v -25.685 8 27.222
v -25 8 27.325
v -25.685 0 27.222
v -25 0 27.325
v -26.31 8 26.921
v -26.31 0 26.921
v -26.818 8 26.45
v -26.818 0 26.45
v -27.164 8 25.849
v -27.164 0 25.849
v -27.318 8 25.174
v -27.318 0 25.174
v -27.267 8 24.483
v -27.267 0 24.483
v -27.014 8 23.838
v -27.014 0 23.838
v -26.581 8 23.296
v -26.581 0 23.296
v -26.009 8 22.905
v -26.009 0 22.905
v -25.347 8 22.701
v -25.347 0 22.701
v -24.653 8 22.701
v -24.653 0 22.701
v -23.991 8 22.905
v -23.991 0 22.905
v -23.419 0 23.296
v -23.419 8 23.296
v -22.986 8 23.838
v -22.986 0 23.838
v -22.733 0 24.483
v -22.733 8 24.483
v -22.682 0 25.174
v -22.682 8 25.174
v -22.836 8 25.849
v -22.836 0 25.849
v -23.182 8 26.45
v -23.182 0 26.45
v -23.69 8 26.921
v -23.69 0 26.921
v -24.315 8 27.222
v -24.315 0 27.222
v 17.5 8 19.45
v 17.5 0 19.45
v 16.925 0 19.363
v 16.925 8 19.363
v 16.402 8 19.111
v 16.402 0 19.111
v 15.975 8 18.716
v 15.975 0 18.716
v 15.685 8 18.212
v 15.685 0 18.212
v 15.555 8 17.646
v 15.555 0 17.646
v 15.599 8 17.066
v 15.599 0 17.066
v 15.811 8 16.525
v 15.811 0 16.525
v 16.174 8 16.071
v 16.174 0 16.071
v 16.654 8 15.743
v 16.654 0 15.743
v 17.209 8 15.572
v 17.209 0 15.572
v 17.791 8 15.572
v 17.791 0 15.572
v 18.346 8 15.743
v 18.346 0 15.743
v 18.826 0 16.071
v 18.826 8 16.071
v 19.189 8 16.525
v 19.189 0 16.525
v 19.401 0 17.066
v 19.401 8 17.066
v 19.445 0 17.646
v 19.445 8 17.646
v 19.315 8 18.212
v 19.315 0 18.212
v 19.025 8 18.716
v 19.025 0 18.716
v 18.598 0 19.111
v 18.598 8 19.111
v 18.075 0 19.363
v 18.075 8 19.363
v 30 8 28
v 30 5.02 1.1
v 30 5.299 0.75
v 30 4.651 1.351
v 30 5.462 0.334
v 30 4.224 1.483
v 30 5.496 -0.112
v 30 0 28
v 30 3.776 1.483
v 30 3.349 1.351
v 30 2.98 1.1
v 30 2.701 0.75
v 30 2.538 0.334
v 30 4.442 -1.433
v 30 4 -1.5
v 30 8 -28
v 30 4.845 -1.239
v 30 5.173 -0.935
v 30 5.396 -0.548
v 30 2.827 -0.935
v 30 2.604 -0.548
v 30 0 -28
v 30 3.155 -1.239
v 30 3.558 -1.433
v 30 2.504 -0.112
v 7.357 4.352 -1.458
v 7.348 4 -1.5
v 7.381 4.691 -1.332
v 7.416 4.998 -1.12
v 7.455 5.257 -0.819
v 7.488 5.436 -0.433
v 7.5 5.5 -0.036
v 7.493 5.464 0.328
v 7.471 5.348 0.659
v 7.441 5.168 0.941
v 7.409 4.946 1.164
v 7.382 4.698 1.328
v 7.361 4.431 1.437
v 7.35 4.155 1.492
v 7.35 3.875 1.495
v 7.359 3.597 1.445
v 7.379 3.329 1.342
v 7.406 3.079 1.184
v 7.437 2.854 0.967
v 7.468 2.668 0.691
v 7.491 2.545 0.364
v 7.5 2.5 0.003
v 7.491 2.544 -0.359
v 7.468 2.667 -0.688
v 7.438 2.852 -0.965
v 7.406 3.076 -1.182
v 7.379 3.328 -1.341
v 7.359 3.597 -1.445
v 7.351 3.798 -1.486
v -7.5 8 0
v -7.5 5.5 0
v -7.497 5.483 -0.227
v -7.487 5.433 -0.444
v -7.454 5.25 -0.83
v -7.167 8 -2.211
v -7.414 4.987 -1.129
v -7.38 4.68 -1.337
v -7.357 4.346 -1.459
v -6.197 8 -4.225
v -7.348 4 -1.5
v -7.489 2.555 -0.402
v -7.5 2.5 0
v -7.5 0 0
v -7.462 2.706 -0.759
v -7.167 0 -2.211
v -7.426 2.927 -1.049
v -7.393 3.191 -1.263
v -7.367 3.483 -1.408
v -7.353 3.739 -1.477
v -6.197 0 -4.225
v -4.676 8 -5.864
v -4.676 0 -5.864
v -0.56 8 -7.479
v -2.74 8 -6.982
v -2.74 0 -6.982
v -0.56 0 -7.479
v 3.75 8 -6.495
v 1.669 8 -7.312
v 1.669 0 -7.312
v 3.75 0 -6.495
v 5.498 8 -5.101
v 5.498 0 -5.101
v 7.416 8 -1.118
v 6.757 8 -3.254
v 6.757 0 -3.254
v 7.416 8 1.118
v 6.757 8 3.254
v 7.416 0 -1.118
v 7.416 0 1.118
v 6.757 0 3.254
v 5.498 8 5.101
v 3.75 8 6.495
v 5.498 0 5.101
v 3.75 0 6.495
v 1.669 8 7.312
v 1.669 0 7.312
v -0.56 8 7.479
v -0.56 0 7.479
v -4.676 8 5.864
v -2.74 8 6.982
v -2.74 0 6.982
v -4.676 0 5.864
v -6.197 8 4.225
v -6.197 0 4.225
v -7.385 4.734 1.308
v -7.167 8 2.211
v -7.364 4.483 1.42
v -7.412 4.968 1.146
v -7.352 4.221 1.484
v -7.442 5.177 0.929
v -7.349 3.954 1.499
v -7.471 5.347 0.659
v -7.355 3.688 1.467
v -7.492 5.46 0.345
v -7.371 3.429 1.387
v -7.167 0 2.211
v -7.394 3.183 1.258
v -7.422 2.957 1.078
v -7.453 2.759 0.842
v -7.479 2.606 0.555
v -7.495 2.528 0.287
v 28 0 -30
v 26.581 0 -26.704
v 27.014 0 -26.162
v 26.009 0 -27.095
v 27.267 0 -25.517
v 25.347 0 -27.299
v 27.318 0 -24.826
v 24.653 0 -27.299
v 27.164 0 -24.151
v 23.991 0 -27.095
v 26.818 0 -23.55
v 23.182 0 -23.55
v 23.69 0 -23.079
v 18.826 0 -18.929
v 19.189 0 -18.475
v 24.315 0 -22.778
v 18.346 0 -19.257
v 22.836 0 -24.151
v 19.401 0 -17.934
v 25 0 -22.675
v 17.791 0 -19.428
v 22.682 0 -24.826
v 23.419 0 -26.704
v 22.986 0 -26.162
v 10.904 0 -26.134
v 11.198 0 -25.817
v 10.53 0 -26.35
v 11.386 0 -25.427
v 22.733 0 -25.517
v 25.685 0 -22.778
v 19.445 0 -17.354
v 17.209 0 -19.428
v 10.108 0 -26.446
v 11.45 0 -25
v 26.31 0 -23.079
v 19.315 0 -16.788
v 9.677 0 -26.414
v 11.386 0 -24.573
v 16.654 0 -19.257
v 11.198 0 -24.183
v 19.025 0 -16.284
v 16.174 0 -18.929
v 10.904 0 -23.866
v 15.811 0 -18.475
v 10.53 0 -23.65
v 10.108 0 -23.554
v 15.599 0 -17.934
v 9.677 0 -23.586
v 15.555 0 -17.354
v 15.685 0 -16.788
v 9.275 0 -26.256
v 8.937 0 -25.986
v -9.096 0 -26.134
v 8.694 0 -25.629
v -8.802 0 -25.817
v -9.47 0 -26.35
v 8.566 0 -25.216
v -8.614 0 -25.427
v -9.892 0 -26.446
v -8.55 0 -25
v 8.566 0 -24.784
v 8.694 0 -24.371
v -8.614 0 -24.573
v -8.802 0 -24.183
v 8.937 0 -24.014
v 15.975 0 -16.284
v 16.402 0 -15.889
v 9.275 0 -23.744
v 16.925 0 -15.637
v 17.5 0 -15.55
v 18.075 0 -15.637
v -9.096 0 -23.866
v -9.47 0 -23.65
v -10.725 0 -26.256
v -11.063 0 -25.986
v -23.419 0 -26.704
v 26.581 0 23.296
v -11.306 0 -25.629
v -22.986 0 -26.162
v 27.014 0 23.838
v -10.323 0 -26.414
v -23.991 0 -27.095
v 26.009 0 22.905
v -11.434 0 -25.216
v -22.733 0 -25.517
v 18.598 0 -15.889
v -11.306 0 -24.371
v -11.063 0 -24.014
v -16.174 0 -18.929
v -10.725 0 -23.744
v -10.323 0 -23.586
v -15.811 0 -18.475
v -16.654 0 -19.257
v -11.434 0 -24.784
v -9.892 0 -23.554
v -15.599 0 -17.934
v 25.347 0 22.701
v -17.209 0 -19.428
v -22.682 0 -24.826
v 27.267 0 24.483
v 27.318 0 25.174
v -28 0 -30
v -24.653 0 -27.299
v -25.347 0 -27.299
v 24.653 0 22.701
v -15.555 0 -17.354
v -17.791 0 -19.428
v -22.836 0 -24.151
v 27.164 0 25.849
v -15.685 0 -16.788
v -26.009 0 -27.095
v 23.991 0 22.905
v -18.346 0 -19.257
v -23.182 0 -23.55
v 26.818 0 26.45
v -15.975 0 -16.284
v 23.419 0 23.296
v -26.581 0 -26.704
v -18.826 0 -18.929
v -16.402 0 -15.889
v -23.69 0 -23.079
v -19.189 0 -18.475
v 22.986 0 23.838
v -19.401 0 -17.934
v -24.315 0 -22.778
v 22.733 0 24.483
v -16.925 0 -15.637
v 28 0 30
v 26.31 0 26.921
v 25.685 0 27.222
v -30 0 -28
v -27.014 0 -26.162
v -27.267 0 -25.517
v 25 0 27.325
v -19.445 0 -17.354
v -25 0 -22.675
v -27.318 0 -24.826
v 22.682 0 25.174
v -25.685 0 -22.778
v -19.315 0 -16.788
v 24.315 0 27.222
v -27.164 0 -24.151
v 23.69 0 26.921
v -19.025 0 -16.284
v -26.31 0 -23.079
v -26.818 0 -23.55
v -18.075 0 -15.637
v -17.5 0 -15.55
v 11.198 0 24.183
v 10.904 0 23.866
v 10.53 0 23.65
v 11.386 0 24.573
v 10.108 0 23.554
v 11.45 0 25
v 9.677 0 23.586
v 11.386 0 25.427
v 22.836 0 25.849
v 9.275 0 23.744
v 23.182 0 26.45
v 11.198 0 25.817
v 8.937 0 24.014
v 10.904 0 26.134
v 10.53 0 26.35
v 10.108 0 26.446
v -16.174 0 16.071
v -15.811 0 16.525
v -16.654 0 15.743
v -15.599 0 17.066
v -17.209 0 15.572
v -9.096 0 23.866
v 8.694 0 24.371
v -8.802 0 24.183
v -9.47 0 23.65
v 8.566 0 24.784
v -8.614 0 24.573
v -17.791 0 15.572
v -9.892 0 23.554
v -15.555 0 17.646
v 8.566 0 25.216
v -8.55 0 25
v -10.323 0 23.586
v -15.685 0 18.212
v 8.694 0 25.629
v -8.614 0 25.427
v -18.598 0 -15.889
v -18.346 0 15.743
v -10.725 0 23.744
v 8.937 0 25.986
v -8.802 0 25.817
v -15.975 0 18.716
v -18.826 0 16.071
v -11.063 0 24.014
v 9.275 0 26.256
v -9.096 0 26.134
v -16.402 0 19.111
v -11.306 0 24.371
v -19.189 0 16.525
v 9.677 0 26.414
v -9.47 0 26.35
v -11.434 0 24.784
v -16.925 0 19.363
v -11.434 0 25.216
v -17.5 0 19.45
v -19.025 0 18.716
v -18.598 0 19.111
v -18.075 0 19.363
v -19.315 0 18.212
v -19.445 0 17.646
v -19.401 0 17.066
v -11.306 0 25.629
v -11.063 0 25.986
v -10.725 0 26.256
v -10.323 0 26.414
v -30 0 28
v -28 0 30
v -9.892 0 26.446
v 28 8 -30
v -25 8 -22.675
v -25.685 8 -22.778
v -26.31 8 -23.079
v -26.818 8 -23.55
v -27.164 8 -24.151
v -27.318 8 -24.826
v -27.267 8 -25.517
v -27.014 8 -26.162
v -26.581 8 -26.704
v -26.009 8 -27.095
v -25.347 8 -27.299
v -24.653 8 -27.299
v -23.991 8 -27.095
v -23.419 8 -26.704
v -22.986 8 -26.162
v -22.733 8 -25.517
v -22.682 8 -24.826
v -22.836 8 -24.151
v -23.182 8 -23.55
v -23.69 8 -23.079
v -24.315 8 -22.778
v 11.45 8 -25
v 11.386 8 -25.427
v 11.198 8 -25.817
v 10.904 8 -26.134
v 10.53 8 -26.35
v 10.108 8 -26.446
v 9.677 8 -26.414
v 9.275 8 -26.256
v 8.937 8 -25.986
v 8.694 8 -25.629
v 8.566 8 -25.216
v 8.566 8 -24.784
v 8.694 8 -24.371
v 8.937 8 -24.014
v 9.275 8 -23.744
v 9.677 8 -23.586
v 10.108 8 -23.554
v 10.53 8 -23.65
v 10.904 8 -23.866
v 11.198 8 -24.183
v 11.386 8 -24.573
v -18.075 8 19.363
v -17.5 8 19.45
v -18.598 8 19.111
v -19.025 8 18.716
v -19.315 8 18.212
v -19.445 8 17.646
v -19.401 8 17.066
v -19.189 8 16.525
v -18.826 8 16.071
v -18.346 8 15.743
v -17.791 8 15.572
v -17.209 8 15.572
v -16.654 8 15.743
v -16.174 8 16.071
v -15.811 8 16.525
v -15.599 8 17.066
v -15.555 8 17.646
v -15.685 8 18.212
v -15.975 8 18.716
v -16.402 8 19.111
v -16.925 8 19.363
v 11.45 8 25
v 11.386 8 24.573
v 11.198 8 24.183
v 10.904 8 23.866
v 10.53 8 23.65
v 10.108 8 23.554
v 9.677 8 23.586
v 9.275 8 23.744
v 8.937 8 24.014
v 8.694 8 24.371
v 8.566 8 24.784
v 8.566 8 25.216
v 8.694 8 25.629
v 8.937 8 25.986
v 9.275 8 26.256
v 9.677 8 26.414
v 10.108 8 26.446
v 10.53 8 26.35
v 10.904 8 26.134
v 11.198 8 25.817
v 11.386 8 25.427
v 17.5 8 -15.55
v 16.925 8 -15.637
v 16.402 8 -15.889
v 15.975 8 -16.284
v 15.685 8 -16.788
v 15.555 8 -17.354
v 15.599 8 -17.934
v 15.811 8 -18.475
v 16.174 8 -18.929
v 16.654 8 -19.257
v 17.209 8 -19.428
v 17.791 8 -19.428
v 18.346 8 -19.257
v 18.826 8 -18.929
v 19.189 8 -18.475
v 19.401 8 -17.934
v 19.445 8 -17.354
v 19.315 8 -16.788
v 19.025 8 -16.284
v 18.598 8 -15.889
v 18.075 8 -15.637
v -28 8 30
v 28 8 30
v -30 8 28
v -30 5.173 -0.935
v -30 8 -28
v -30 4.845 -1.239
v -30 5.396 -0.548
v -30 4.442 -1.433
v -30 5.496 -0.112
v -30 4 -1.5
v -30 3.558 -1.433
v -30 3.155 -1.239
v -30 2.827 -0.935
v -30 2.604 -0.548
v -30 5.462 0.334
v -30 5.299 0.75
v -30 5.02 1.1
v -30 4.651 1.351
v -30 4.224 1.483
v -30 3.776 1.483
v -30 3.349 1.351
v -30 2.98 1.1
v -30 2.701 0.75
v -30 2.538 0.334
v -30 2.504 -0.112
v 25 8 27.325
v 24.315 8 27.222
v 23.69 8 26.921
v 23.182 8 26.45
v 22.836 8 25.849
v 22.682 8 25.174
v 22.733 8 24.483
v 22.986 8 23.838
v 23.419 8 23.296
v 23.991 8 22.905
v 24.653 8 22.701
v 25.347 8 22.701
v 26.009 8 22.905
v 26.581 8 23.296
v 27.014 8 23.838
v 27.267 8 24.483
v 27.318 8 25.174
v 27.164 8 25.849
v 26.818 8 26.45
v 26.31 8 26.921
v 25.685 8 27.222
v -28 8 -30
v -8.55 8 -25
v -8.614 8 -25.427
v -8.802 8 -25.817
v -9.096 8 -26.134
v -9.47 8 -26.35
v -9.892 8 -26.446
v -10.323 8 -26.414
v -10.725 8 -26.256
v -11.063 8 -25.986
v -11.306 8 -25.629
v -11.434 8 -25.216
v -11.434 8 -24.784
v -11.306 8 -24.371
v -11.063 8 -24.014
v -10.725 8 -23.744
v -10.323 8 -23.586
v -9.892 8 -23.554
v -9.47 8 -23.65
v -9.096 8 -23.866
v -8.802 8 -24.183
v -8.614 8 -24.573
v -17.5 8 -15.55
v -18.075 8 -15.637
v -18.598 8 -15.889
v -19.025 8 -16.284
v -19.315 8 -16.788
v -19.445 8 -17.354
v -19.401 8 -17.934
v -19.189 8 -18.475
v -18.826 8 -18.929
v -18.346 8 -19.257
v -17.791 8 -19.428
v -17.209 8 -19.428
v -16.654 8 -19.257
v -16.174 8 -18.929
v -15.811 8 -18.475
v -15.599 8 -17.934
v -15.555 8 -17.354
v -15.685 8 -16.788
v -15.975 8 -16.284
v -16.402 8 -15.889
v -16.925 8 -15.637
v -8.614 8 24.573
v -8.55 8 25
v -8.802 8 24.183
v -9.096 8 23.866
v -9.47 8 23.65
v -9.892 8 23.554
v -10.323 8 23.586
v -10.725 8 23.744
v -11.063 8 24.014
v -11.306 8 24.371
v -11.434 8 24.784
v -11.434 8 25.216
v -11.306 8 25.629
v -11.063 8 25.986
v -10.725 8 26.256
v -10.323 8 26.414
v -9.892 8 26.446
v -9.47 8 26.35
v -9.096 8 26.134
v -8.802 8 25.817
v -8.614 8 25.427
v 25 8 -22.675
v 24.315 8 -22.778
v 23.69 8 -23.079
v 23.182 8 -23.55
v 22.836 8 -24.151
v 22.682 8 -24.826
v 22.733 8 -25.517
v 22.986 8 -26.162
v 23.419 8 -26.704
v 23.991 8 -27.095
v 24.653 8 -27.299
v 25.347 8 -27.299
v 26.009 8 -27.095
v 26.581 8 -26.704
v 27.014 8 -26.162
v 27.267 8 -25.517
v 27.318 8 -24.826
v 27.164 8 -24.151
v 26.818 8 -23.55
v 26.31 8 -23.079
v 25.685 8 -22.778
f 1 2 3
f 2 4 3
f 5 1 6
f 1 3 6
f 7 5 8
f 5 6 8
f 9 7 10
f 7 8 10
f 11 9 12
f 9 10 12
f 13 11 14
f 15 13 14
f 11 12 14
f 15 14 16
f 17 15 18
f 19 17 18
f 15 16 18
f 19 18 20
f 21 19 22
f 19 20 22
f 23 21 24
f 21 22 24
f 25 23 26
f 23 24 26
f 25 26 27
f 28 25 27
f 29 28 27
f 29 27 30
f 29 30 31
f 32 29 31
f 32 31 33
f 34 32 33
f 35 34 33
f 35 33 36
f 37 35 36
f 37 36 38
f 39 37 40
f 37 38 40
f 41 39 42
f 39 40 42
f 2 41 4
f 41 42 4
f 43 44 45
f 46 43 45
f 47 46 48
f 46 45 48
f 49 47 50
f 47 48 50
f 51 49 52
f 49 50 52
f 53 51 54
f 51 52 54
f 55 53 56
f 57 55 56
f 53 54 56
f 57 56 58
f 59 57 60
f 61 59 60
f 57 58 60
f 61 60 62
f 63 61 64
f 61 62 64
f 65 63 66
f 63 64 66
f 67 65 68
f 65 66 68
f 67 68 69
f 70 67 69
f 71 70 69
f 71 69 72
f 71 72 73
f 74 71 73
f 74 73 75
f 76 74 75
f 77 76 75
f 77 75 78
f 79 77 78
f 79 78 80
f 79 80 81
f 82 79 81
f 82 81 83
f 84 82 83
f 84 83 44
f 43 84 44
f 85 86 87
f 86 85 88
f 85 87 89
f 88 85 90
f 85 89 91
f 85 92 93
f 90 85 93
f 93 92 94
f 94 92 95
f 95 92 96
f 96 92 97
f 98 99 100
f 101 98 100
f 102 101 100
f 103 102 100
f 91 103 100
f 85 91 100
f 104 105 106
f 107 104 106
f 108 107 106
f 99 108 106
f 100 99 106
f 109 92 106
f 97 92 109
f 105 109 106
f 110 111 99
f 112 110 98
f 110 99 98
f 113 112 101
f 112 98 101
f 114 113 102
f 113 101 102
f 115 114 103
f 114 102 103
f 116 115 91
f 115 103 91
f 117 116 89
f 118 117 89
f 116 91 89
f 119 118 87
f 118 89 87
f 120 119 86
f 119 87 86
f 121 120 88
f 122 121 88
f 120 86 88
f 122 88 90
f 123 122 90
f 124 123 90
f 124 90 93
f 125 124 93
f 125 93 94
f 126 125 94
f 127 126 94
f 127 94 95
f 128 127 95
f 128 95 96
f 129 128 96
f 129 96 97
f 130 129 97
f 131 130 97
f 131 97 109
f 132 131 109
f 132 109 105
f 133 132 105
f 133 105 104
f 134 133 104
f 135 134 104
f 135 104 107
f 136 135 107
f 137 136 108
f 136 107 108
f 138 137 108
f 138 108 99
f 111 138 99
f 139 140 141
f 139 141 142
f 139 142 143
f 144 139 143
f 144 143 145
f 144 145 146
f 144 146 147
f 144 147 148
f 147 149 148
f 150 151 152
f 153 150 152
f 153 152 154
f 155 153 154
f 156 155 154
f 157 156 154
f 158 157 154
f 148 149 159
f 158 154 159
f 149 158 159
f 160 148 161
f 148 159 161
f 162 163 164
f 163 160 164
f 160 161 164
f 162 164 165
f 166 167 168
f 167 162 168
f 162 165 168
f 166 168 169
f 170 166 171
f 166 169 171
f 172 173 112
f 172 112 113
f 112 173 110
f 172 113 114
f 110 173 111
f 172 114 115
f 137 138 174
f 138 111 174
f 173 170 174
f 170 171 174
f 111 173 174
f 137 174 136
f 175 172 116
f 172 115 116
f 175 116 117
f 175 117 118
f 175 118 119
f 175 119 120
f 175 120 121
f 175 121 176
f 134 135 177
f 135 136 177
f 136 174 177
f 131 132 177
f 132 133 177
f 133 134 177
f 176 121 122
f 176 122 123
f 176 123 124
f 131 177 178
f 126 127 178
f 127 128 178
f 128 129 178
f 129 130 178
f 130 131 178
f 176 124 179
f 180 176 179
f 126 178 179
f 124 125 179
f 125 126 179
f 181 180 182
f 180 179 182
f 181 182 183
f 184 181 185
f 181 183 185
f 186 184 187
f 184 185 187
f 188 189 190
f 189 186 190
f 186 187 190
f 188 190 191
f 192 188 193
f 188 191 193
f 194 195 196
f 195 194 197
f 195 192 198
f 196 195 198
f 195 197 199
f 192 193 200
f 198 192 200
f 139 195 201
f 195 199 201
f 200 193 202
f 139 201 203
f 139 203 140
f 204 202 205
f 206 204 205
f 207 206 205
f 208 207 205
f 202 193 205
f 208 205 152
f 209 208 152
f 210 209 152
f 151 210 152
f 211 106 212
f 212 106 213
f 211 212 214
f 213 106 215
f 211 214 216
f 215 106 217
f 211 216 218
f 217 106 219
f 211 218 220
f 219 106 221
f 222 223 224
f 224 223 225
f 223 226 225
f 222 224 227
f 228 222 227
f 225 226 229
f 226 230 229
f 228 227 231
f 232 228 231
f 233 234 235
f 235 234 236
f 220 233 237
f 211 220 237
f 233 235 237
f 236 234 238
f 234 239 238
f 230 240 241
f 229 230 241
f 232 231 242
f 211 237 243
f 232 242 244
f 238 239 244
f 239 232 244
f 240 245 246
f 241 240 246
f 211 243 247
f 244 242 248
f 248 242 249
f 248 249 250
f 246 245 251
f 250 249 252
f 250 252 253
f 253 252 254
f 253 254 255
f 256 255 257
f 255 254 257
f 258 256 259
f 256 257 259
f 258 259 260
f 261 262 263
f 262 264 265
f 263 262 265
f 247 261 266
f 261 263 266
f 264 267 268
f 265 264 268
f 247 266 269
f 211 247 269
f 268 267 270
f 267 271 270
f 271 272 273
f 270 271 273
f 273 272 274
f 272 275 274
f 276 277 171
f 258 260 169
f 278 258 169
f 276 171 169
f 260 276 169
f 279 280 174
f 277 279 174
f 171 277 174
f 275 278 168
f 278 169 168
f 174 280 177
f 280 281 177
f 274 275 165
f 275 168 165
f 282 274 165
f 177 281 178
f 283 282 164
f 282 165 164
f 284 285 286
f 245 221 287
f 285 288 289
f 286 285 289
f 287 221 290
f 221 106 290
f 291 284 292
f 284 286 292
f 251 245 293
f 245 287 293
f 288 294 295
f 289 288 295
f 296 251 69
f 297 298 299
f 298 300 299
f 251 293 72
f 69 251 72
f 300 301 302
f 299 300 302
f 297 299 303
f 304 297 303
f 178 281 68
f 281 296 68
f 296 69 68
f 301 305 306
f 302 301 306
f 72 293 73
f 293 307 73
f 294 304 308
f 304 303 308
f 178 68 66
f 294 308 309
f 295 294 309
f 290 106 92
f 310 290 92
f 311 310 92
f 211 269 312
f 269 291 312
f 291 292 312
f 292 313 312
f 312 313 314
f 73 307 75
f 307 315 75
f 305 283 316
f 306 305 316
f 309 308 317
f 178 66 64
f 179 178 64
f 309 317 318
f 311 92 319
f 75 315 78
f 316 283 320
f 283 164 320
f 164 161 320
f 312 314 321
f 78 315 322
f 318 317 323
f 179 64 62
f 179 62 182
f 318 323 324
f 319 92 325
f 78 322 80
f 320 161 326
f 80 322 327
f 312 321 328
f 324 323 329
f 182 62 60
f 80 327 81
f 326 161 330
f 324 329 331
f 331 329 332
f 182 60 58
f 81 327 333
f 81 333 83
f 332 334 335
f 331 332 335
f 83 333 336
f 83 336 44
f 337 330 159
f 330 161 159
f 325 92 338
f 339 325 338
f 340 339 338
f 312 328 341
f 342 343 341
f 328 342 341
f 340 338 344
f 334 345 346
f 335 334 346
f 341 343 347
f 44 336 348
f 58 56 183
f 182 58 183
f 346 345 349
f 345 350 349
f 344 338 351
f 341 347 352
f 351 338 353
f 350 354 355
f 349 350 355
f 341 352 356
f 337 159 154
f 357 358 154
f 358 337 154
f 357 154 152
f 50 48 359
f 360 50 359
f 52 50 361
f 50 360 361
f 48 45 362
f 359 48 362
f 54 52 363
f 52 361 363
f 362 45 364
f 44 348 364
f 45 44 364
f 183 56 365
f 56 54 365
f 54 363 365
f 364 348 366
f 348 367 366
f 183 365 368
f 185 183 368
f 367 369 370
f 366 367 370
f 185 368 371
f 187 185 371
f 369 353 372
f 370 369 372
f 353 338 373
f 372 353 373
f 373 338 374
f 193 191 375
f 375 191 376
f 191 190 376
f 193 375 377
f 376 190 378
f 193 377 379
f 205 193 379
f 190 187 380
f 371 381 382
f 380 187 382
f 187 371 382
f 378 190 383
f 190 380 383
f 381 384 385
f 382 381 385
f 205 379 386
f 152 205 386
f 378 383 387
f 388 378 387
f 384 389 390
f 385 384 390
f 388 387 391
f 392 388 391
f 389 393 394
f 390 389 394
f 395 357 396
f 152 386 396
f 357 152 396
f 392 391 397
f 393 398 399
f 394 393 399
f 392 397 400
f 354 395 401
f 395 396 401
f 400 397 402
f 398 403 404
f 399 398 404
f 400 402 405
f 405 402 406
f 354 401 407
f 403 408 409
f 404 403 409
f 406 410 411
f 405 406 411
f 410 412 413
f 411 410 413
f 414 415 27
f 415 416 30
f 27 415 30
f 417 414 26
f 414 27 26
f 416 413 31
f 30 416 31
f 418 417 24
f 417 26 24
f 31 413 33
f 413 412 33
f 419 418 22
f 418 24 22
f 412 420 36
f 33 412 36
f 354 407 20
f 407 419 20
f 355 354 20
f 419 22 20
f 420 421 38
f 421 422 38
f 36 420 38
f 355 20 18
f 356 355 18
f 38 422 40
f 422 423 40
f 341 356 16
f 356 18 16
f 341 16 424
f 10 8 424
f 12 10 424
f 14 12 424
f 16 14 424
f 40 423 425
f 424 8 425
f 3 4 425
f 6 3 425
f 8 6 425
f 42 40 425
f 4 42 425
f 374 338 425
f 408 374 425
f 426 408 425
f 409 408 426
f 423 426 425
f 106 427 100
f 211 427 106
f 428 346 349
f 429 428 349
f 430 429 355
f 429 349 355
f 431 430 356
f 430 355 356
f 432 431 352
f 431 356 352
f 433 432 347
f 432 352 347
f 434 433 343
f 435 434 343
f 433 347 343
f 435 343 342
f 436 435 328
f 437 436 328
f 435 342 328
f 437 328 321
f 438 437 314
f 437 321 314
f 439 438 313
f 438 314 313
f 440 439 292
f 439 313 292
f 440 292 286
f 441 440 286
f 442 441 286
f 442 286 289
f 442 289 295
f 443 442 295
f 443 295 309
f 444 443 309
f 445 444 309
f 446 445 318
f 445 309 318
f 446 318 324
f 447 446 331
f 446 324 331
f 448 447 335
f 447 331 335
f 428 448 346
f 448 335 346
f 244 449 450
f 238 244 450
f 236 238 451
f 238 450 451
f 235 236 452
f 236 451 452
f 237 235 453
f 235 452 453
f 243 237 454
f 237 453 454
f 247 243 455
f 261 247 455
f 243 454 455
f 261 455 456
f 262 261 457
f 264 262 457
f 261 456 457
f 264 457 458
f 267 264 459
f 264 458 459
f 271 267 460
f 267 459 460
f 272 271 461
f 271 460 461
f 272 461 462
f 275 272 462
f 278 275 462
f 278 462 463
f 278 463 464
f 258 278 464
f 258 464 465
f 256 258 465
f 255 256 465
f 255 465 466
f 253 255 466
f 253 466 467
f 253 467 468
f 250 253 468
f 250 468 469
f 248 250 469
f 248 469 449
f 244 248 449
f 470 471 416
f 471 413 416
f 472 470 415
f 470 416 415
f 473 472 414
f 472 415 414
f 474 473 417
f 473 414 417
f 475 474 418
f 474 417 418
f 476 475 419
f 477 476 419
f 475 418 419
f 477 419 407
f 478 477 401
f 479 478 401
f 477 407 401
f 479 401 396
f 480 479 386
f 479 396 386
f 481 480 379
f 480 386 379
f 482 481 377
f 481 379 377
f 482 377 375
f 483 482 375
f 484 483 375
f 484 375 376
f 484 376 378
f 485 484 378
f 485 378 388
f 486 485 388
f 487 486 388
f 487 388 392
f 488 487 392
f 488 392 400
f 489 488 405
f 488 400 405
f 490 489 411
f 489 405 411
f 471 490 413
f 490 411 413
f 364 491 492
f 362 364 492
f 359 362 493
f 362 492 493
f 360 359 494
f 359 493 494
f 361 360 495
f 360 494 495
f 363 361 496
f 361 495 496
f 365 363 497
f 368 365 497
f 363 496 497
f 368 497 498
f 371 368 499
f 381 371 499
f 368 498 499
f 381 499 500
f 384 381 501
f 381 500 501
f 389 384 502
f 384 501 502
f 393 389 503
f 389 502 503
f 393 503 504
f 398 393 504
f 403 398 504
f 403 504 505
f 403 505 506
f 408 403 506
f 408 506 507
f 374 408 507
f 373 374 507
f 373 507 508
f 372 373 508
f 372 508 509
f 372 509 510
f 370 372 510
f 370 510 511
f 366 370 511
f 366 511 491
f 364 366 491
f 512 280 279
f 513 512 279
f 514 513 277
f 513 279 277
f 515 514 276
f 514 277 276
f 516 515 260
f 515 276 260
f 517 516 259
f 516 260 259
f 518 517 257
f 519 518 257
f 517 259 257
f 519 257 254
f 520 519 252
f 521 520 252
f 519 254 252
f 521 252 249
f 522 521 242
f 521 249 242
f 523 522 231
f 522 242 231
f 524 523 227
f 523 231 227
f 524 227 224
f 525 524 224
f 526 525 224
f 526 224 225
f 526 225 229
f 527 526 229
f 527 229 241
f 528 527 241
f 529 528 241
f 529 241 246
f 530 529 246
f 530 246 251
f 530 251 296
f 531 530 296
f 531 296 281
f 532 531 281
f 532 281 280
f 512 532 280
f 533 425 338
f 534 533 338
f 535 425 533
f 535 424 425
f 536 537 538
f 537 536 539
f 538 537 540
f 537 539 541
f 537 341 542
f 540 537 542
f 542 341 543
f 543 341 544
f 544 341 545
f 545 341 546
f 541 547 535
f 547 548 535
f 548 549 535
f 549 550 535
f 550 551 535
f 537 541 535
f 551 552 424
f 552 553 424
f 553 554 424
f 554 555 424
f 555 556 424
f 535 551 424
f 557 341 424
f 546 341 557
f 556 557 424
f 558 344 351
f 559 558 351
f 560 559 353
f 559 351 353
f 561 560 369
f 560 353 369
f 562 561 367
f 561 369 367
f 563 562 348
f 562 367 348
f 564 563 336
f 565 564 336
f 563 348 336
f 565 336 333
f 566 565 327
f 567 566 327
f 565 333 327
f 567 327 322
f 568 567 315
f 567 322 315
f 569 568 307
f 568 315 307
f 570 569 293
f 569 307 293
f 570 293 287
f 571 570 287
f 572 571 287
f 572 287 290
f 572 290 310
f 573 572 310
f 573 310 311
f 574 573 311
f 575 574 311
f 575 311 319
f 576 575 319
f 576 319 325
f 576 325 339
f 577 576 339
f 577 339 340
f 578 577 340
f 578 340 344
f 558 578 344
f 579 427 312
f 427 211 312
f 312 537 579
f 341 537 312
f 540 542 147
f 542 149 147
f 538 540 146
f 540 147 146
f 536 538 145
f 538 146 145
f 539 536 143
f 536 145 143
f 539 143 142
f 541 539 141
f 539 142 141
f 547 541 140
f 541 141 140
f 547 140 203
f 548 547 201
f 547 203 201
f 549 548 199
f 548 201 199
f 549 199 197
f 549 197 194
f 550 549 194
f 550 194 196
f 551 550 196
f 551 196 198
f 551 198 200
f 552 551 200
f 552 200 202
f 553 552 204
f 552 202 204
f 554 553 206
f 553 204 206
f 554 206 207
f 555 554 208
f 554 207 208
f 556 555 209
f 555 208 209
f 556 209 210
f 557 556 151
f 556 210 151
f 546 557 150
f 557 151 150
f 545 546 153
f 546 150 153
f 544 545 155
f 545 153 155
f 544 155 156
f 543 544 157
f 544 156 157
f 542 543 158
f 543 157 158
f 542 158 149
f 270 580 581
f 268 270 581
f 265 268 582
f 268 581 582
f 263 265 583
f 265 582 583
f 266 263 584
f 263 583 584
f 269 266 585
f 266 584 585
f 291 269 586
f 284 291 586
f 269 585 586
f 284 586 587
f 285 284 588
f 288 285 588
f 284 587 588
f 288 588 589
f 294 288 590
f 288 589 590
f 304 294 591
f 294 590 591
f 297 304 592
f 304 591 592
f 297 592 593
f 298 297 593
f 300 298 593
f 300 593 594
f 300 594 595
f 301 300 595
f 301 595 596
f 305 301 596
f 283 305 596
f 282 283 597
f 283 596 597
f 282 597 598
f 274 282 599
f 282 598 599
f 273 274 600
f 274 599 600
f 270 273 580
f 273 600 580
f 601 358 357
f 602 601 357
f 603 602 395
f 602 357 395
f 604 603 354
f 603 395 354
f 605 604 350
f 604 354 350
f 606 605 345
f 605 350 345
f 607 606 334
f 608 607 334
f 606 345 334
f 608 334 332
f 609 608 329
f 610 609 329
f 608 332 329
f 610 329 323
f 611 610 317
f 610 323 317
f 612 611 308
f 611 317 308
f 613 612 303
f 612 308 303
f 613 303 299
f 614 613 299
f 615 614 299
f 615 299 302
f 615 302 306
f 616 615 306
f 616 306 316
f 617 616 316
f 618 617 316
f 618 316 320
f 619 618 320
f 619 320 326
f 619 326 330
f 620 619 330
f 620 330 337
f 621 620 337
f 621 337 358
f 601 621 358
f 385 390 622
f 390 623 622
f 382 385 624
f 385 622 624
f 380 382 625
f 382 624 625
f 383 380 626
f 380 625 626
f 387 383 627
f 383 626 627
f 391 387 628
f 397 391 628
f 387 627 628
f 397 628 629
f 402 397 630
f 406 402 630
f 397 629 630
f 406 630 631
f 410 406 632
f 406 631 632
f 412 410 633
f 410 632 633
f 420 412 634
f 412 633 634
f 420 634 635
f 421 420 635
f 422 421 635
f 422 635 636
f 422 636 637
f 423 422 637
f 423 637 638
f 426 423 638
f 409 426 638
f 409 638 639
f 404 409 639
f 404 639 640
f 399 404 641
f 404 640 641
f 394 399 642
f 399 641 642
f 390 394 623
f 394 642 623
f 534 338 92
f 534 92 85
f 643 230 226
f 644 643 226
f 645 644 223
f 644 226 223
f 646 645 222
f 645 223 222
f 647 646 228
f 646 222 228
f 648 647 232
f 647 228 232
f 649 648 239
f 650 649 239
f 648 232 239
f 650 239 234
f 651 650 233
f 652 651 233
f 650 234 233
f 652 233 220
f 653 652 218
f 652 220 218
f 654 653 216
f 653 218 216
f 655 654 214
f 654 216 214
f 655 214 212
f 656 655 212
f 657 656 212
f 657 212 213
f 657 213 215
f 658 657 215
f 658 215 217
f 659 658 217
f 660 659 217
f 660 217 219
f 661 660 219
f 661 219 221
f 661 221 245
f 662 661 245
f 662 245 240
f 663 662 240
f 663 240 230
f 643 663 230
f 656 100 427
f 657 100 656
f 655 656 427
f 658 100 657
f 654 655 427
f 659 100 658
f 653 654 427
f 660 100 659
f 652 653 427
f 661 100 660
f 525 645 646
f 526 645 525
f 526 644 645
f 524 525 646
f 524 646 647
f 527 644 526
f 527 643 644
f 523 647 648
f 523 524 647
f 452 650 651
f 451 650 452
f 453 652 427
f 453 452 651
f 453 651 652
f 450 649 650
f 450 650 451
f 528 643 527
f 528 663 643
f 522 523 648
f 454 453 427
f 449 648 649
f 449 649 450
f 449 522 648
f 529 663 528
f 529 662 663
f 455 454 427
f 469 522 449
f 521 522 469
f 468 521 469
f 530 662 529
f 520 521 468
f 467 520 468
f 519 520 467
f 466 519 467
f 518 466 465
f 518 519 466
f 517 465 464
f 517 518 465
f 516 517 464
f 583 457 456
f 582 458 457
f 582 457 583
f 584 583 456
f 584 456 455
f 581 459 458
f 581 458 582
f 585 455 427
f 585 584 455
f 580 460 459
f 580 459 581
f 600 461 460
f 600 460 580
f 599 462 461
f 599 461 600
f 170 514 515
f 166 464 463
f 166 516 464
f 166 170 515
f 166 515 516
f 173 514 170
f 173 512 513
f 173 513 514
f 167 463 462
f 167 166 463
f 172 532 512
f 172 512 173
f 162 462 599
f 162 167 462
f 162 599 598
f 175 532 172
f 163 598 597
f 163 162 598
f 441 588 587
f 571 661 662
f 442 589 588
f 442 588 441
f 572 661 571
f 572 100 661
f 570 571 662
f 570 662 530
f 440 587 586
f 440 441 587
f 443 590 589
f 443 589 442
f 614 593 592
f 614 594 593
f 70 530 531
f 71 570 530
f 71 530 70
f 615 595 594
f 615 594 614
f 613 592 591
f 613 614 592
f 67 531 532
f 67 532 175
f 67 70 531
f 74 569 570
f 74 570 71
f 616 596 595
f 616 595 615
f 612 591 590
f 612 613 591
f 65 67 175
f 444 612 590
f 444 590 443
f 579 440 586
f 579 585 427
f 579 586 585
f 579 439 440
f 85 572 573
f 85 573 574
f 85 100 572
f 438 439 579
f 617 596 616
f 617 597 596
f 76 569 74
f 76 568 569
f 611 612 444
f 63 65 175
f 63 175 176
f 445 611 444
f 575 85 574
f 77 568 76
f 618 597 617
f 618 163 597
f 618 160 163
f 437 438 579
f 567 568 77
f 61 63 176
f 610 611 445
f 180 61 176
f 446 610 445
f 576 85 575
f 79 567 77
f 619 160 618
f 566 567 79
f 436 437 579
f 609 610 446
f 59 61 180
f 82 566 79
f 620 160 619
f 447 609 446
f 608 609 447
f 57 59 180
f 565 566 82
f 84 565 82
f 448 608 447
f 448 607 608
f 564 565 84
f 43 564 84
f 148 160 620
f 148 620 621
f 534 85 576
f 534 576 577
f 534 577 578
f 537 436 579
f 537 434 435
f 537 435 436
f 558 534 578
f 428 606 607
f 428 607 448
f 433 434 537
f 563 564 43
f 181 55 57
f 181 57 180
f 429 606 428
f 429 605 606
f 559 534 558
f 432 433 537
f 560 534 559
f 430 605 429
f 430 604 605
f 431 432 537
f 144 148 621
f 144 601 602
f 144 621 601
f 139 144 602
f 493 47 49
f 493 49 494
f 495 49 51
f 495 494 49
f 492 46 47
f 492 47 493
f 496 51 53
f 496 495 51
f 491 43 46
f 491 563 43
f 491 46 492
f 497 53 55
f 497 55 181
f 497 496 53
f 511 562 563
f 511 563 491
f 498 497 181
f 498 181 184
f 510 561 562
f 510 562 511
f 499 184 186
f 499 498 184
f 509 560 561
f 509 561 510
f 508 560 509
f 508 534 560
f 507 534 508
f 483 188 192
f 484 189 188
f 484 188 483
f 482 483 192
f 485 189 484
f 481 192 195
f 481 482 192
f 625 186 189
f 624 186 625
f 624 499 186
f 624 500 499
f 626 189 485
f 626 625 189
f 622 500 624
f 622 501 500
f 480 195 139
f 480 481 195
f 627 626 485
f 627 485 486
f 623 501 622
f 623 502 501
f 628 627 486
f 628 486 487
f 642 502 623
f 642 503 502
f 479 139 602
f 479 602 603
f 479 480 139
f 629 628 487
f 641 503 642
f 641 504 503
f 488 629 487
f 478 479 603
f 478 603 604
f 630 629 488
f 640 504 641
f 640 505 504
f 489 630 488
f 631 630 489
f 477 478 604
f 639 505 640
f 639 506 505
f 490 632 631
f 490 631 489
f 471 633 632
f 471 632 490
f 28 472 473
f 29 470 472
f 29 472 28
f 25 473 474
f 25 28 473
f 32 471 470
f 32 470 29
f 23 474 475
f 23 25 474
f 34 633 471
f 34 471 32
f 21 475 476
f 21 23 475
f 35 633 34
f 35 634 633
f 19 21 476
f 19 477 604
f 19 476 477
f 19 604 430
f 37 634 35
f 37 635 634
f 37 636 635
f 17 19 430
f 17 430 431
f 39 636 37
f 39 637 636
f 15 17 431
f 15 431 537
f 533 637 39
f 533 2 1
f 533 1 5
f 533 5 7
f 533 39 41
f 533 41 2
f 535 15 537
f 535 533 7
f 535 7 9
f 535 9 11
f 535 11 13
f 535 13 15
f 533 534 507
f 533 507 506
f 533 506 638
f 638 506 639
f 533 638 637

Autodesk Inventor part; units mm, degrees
ref_plane "YZ Plane" through (0, 0, 0) normal (1, 0, 0) x (0, 1, 0)
ref_plane "XZ Plane" through (0, 0, 0) normal (0, 1, 0) x (-1, 0, 0)
ref_plane "XY Plane" through (0, 0, 0) normal (0, 0, 1) x (1, 0, 0)
sketch "Sketch1" plane through (0, 0, 0) normal (0, 1, 0) x (-1, 0, 0)
  line L0 (-30, -30) -> (30, -30)
  line L1 (30, -30) -> (30, 30)
  line L2 (30, 30) -> (-30, 30)
  line L3 (-30, 30) -> (-30, -30)
  line L4 (-30, -30) -> (30, 30) construction
  line L5 (30, -30) -> (-30, 30) construction
  circle A0 centre (0, 0) radius 7.5
  circle A1 centre (-25, 25) radius 1.95 projected
  circle A2 centre (0, 25) radius 1.95 projected
  circle A3 centre (0, 25) radius 1.95 projected
  circle A4 centre (25, 0) radius 1.95 projected
  circle A5 centre (25, -25) radius 1.95 projected
  circle A6 centre (-25, 25) radius 1.95 projected
  circle A7 centre (-25, -25) radius 1.95 projected
  circle A8 centre (25, 25) radius 1.95 projected
  circle A9 centre (-25, 0) radius 1.95 projected
  circle A10 centre (0, -25) radius 1.95 projected
  line L6 (28, 30) -> (30, 28) projected
  line L7 (30, 28) -> (30, -28) projected
  line L8 (30, -28) -> (28, -30) projected
  line L9 (28, -30) -> (-28, -30) projected
  line L10 (-28, -30) -> (-30, -28) projected
  line L11 (-30, -28) -> (-30, 28) projected
  line L12 (-30, 28) -> (-28, 30) projected
  line L13 (-28, 30) -> (28, 30) projected
  dimension "d0" = 60
  dimension "d1" = 60
  dimension "d13" = 15
extrude "Extrusion1" add sketch "Sketch1" along normal blind 8 contours L3 L10 L0 | L10 L3 L12 L2 L6 L1 L8 L0 | L8 L1 L0 | L3 L2 L12 | L6 L2 L1 | A1 | A2 | A4 | A5 | A7 | A8 | A9 | A10
sketch "Sketch2" plane through (0, 8, 0) normal (0, 1, 0) x (1, 0, 0)
  line L0 (30, 30) -> (-30, 30) projected
  line L1 (-30, 30) -> (-30, -30) projected
  line L2 (-30, -30) -> (30, -30) projected
  line L3 (30, -30) -> (30, 30) projected
  line L4 (17.5, -17.5) -> (-17.5, -17.5)
  line L5 (-17.5, -17.5) -> (-17.5, 17.5)
  line L6 (-17.5, 17.5) -> (17.5, 17.5)
  line L7 (17.5, 17.5) -> (17.5, -17.5)
  line L8 (17.5, -17.5) -> (-17.5, 17.5) construction
  line L9 (-17.5, -17.5) -> (17.5, 17.5) construction
  line L10 (0, -17.5) -> (0, 17.5)
  line L11 (-17.5, 0) -> (17.5, 0)
  point P0 (0, 0)
  dimension "d4" = 35
  dimension "d5" = 35
hole "Hole1" at (-17.5, 8, 17.5) at (-17.5, 8, -17.5) at (17.5, 8, -17.5) at (17.5, 8, 17.5) direction (0, -1, 0) diameter 3.9 depth 10 tip angle 118
chamfer "Chamfer1" distance 2 angle 45 4 edges at (30, 4, 30) (30, 4, -30) (-30, 4, -30) (-30, 4, 30)
sketch "Sketch3" plane through (0, 8, 0) normal (0, 1, 0) x (1, 0, 0)
  line L0 (-28, -30) -> (-30, -28) projected
  line L1 (-28, -30) -> (28, -30) projected
  line L2 (30, -28) -> (28, -30) projected
  line L3 (30, -28) -> (30, 28) projected
  line L4 (28, 30) -> (30, 28) projected
  line L5 (28, 30) -> (-28, 30) projected
  line L6 (-30, 28) -> (-28, 30) projected
  line L7 (-30, 28) -> (-30, -28) projected
  circle A0 centre (17.5, 17.5) radius 1.95 projected
  circle A1 centre (-17.5, -17.5) radius 1.95 projected
  circle A2 centre (-17.5, 17.5) radius 1.95 projected
  circle A3 centre (17.5, -17.5) radius 1.95 projected
  circle A4 centre (0, 0) radius 7.5 projected
  line L8 (25, -25) -> (-25, -25)
  line L9 (-25, -25) -> (-25, 25)
  line L10 (-25, 25) -> (25, 25)
  line L11 (25, 25) -> (25, -25)
  line L12 (25, -25) -> (-25, 25) construction
  line L13 (-25, -25) -> (25, 25) construction
  dimension "d17" = 50
  dimension "d18" = 50
hole "Hole2" at (-25, 8, -25) at (25, 8, -25) at (25, 8, 25) at (-25, 8, 25) direction (0, -1, 0) diameter 4.65 end through all
sketch "Sketch4" plane through (30, 0, 28) normal (1, 0, 0) x (0, 0, -1)
  line L0 (56, 8) -> (56, 0) projected
  line L1 (0, 8) -> (56, 8) projected
  line L2 (0, 0) -> (0, 8) projected
  line L3 (0, 0) -> (56, 0) projected
  circle A0 centre (28, 4) radius 1.5
  line L4 (-2, 8) -> (-2, 0) projected
  point P0 (28, 0)
  dimension "d26" = 3
  dimension "d27" = 4
  dimension "d28" = 30
extrude "Extrusion2" cut sketch "Sketch4" against normal through all contours A0
sketch "Sketch5" plane through (0, 8, 0) normal (0, 1, 0) x (1, 0, 0)
  circle A0 centre (25, -25) radius 2.325 projected
  circle A1 centre (-25, -25) radius 2.325 projected
  circle A2 centre (25, 25) radius 2.325 projected
  circle A3 centre (-25, 25) radius 2.325 projected
  circle A4 centre (10, -25) radius 1.45
  circle A5 centre (-10, -25) radius 1.45
  circle A6 centre (10, 25) radius 1.45
  circle A7 centre (-10, 25) radius 1.45
  point P0 (0, 0)
  dimension "d31" = 2.9
  dimension "d32" = 2.9
  dimension "d33" = 15
  dimension "d34" = 15
  dimension "d35" = 2.9
  dimension "d36" = 2.9
extrude "Extrusion3" cut sketch "Sketch5" against normal blind 10 contours A4 | A5 | A6 | A7
properties part number "00_XY_stage-CHUO_SEIKI_LD-647-R1-Top"
